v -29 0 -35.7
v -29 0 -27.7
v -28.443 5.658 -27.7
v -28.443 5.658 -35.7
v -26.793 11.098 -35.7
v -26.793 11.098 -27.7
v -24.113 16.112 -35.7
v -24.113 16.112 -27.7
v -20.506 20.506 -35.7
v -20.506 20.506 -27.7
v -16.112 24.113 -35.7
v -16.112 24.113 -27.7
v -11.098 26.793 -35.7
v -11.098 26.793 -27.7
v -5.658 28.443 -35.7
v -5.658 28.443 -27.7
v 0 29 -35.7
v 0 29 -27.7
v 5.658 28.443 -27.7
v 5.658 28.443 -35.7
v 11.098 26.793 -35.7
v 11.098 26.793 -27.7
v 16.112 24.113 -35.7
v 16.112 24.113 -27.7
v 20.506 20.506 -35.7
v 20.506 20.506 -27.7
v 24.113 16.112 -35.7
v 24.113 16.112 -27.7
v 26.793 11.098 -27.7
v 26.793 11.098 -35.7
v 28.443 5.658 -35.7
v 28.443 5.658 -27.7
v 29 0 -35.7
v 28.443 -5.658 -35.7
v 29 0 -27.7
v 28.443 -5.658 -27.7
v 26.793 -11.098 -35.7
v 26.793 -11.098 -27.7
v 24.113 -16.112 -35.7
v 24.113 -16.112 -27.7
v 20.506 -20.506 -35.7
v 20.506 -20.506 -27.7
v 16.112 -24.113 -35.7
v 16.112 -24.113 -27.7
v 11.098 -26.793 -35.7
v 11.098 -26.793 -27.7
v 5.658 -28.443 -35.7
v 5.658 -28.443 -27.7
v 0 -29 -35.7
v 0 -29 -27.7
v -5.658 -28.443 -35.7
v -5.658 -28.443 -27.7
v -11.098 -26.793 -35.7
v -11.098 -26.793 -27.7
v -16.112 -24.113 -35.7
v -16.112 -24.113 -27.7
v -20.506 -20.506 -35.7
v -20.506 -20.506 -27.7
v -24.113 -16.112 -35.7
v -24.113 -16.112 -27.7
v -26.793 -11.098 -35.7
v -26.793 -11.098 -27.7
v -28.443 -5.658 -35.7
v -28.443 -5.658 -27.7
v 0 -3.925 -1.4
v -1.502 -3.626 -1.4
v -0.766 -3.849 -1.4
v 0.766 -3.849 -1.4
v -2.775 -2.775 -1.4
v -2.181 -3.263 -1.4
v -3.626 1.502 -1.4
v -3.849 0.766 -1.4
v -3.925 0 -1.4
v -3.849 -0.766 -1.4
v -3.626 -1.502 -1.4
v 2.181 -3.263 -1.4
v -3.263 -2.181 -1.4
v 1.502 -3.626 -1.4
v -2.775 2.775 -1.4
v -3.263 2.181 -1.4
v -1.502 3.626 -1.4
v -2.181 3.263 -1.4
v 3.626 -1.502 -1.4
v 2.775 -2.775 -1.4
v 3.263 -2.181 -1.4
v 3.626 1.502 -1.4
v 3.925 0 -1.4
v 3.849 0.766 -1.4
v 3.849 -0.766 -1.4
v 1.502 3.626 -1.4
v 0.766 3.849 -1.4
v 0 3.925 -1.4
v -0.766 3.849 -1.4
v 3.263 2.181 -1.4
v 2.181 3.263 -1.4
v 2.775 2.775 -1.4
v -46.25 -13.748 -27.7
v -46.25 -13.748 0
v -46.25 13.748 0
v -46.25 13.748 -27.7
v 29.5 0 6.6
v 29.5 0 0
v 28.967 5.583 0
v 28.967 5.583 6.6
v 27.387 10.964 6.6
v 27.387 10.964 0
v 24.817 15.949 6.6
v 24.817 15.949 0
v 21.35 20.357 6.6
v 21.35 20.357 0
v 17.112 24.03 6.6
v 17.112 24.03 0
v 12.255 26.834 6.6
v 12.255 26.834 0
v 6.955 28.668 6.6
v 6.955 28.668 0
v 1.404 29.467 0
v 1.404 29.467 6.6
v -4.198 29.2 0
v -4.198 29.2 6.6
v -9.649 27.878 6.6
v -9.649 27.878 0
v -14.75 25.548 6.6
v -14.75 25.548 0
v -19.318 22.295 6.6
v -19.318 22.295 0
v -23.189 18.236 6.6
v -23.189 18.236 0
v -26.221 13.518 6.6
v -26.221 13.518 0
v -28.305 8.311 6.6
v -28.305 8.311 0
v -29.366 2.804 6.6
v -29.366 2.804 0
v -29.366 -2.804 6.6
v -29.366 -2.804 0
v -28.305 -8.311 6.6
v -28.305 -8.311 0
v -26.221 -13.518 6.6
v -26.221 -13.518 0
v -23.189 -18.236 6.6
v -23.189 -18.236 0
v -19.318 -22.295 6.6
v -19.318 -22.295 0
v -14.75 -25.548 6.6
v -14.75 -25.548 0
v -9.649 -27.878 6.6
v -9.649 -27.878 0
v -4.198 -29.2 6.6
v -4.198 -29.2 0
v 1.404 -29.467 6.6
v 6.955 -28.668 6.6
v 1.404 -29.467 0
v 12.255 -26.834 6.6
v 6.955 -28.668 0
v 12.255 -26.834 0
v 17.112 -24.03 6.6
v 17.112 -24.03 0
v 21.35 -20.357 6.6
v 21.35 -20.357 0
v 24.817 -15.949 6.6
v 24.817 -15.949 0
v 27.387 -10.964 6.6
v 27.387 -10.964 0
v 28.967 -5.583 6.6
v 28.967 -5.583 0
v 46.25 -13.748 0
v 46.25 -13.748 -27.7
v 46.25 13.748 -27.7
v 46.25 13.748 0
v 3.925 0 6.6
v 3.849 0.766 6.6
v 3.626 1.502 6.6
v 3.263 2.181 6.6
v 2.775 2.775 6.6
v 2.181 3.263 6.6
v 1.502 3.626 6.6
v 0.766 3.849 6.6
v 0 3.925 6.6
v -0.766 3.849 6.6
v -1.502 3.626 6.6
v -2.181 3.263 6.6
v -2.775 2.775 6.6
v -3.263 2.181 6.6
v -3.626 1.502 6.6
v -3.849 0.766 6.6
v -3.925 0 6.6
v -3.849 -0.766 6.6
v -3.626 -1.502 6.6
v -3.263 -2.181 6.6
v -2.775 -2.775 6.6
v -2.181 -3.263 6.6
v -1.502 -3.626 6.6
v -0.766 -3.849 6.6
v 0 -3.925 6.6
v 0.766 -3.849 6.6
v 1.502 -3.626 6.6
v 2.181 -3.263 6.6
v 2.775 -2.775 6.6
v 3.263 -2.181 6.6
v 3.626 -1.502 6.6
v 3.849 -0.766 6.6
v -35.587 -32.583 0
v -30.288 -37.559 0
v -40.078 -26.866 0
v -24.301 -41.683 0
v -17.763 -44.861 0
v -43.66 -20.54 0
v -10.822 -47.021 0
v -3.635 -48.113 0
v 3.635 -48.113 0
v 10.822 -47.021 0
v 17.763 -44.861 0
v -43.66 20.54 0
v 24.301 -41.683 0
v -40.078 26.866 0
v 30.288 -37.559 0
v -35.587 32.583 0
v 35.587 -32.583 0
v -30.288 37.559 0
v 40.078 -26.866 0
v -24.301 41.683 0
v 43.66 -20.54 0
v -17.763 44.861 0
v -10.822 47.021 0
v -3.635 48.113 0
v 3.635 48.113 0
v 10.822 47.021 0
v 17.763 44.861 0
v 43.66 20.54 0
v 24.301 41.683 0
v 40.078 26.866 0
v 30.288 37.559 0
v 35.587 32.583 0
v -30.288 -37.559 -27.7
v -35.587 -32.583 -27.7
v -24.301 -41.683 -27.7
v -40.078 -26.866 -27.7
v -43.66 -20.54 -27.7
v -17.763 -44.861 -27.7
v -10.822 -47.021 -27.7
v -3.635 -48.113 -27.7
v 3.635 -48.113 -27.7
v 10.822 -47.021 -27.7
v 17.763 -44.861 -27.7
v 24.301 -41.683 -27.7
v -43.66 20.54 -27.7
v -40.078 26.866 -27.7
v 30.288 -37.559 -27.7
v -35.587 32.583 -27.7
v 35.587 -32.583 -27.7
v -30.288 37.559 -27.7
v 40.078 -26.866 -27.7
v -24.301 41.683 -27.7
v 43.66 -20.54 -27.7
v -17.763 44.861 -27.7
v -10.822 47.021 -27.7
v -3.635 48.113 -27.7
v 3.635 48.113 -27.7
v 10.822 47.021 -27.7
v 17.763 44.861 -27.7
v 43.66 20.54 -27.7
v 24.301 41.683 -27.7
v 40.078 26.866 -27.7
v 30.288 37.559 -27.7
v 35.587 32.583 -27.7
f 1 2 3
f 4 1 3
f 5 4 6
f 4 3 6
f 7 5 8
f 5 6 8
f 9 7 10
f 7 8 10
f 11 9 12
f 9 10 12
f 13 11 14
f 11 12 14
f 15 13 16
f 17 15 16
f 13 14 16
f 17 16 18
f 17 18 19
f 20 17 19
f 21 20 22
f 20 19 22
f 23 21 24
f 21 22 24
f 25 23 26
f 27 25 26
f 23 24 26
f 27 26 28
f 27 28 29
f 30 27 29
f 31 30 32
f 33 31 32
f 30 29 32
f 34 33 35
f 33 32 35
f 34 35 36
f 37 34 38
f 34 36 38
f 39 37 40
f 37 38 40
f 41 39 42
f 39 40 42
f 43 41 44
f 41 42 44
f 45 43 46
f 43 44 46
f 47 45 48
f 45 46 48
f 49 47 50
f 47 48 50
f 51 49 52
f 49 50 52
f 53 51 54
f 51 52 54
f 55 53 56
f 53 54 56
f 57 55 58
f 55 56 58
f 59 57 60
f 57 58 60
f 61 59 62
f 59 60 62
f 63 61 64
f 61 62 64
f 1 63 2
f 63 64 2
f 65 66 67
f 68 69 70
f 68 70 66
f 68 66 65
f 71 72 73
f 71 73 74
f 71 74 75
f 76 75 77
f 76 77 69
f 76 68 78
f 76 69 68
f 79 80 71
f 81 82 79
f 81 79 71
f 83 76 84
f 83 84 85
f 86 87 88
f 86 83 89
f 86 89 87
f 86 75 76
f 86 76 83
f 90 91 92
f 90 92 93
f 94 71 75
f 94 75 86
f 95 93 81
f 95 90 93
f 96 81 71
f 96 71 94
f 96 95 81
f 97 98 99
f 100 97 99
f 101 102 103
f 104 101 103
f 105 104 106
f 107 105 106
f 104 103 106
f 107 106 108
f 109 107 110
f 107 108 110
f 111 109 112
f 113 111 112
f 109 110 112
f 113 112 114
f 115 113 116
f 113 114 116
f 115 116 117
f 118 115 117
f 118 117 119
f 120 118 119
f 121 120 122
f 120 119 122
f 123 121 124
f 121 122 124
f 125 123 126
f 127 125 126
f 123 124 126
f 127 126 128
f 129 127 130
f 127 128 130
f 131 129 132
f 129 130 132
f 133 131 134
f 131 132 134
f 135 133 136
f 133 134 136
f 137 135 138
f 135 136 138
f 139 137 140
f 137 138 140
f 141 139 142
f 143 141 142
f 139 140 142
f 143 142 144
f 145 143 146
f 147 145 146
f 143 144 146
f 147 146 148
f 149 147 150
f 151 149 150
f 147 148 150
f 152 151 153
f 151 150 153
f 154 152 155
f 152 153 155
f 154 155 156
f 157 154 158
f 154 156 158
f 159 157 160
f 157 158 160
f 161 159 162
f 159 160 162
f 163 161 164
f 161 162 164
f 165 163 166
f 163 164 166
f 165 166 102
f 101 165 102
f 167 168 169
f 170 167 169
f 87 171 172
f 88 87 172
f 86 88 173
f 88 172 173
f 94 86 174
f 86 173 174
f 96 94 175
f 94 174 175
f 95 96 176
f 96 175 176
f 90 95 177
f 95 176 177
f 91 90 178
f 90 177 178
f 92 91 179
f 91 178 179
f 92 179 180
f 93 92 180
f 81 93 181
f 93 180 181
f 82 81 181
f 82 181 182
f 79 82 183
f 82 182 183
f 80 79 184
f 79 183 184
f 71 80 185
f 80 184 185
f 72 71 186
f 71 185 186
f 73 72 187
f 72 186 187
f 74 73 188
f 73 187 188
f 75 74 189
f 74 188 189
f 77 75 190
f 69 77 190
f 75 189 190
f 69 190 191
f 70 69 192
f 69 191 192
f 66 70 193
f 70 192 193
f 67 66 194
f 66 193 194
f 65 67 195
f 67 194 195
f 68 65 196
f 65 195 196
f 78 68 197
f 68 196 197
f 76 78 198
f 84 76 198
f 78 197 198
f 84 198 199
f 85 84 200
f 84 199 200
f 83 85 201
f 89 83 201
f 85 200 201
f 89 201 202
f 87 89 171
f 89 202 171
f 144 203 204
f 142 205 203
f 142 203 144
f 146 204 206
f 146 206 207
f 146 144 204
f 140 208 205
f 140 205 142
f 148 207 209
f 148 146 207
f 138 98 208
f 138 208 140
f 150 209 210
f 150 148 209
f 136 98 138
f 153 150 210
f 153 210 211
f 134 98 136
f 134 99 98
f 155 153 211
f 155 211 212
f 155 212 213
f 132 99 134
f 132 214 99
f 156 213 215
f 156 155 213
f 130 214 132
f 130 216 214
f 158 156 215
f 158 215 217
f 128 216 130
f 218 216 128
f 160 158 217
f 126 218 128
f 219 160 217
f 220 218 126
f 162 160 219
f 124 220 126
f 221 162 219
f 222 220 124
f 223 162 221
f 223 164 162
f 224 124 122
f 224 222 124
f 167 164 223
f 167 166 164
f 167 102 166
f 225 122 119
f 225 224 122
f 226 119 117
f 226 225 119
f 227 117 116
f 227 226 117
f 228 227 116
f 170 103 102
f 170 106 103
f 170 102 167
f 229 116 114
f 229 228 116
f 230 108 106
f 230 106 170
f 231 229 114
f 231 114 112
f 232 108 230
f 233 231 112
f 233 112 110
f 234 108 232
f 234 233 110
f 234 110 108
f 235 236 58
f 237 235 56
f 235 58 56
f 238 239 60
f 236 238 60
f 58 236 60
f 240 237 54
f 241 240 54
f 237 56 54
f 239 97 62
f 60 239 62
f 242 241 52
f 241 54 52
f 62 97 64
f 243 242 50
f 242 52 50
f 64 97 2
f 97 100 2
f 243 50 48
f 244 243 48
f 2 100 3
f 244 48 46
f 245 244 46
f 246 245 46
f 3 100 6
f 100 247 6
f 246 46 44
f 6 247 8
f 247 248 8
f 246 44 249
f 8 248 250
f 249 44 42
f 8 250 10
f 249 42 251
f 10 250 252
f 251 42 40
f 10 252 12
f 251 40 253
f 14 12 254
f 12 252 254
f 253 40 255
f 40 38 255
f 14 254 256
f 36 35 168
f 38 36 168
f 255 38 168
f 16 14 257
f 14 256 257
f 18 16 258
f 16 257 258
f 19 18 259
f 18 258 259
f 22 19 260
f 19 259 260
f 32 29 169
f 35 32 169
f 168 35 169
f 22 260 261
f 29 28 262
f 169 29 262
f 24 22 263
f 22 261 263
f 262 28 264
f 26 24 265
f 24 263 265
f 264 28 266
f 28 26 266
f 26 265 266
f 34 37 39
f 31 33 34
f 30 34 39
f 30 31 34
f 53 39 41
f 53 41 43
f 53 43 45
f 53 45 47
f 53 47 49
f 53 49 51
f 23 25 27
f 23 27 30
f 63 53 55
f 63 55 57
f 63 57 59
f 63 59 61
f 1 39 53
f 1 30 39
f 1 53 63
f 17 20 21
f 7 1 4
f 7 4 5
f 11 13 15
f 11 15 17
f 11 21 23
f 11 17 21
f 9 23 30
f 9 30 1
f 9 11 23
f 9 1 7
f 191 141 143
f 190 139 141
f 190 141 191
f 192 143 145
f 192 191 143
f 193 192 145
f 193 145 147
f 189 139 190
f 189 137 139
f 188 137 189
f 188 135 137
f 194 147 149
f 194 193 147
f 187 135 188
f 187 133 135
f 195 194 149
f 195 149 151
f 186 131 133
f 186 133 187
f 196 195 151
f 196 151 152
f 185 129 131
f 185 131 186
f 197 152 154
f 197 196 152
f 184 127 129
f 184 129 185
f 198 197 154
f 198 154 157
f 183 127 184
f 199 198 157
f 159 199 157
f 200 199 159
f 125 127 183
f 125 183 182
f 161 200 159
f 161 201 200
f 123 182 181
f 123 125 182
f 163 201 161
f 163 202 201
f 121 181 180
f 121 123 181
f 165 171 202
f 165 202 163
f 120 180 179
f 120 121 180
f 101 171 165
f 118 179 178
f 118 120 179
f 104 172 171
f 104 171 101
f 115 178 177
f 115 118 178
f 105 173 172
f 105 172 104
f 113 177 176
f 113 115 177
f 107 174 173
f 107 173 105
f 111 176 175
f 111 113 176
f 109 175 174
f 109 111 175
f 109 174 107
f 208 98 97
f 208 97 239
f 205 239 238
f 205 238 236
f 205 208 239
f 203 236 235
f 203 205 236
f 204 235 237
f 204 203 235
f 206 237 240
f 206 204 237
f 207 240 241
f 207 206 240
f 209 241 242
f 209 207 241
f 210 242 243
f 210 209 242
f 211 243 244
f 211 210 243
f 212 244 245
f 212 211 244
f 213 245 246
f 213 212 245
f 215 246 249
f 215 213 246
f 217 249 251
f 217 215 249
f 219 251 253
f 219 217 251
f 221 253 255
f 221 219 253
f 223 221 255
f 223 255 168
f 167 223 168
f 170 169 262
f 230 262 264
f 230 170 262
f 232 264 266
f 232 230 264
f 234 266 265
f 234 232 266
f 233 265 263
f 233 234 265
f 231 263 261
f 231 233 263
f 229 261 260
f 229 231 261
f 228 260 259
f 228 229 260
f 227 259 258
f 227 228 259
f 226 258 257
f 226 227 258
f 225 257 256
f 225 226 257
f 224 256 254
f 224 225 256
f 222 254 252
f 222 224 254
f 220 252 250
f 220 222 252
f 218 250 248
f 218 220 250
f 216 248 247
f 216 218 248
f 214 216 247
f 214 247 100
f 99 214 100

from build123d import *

# Parameters (mm, degrees)
SKETCH1_R           = 48.25
BOSS_EXTRUDE1_DEPTH = 27.7
SKETCH2_R           = 29.5
BOSS_EXTRUDE2_DEPTH = 6.6
SKETCH3_R           = 29
BOSS_EXTRUDE3_DEPTH = 8
SKETCH4_R           = 3.924903364
CUT_EXTRUDE1_DEPTH  = 8
SKETCH6_W           = 13.813607538
SKETCH6_H           = 65.464487898
SKETCH6_W_2         = 19.669375951
SKETCH6_H_2         = 76.725581
CUT_EXTRUDE2_DEPTH  = 39


with BuildPart() as part:
    # Sketch1 → Boss-Extrude1 (new body)
    with BuildSketch(Plane.XY):
        Circle(SKETCH1_R)
    extrude(amount=-BOSS_EXTRUDE1_DEPTH)

    # Sketch2 → Boss-Extrude2 (add)
    with BuildSketch(Plane.XY):
        Circle(SKETCH2_R)
    extrude(amount=BOSS_EXTRUDE2_DEPTH)

    # Sketch3 → Boss-Extrude3 (add)
    with BuildSketch(Plane(origin=(0, 0, -27.7), x_dir=(-1, 0, 0), z_dir=(0, 0, -1))):
        Circle(SKETCH3_R)
    extrude(amount=BOSS_EXTRUDE3_DEPTH)

    # Sketch4 → Cut-Extrude1 (cut)
    with BuildSketch(Plane.XY.offset(6.6)):
        Circle(SKETCH4_R)
    extrude(amount=-CUT_EXTRUDE1_DEPTH, mode=Mode.SUBTRACT)

    # Sketch6 → Cut-Extrude2 (cut)
    with BuildSketch(Plane.XY):
        with Locations((-53.156803769, 0.938424425)):
            Rectangle(SKETCH6_W, SKETCH6_H)
        with Locations((56.084687976, -0.187684885)):
            Rectangle(SKETCH6_W_2, SKETCH6_H_2)
    extrude(amount=-CUT_EXTRUDE2_DEPTH, mode=Mode.SUBTRACT)


solid = part.part
